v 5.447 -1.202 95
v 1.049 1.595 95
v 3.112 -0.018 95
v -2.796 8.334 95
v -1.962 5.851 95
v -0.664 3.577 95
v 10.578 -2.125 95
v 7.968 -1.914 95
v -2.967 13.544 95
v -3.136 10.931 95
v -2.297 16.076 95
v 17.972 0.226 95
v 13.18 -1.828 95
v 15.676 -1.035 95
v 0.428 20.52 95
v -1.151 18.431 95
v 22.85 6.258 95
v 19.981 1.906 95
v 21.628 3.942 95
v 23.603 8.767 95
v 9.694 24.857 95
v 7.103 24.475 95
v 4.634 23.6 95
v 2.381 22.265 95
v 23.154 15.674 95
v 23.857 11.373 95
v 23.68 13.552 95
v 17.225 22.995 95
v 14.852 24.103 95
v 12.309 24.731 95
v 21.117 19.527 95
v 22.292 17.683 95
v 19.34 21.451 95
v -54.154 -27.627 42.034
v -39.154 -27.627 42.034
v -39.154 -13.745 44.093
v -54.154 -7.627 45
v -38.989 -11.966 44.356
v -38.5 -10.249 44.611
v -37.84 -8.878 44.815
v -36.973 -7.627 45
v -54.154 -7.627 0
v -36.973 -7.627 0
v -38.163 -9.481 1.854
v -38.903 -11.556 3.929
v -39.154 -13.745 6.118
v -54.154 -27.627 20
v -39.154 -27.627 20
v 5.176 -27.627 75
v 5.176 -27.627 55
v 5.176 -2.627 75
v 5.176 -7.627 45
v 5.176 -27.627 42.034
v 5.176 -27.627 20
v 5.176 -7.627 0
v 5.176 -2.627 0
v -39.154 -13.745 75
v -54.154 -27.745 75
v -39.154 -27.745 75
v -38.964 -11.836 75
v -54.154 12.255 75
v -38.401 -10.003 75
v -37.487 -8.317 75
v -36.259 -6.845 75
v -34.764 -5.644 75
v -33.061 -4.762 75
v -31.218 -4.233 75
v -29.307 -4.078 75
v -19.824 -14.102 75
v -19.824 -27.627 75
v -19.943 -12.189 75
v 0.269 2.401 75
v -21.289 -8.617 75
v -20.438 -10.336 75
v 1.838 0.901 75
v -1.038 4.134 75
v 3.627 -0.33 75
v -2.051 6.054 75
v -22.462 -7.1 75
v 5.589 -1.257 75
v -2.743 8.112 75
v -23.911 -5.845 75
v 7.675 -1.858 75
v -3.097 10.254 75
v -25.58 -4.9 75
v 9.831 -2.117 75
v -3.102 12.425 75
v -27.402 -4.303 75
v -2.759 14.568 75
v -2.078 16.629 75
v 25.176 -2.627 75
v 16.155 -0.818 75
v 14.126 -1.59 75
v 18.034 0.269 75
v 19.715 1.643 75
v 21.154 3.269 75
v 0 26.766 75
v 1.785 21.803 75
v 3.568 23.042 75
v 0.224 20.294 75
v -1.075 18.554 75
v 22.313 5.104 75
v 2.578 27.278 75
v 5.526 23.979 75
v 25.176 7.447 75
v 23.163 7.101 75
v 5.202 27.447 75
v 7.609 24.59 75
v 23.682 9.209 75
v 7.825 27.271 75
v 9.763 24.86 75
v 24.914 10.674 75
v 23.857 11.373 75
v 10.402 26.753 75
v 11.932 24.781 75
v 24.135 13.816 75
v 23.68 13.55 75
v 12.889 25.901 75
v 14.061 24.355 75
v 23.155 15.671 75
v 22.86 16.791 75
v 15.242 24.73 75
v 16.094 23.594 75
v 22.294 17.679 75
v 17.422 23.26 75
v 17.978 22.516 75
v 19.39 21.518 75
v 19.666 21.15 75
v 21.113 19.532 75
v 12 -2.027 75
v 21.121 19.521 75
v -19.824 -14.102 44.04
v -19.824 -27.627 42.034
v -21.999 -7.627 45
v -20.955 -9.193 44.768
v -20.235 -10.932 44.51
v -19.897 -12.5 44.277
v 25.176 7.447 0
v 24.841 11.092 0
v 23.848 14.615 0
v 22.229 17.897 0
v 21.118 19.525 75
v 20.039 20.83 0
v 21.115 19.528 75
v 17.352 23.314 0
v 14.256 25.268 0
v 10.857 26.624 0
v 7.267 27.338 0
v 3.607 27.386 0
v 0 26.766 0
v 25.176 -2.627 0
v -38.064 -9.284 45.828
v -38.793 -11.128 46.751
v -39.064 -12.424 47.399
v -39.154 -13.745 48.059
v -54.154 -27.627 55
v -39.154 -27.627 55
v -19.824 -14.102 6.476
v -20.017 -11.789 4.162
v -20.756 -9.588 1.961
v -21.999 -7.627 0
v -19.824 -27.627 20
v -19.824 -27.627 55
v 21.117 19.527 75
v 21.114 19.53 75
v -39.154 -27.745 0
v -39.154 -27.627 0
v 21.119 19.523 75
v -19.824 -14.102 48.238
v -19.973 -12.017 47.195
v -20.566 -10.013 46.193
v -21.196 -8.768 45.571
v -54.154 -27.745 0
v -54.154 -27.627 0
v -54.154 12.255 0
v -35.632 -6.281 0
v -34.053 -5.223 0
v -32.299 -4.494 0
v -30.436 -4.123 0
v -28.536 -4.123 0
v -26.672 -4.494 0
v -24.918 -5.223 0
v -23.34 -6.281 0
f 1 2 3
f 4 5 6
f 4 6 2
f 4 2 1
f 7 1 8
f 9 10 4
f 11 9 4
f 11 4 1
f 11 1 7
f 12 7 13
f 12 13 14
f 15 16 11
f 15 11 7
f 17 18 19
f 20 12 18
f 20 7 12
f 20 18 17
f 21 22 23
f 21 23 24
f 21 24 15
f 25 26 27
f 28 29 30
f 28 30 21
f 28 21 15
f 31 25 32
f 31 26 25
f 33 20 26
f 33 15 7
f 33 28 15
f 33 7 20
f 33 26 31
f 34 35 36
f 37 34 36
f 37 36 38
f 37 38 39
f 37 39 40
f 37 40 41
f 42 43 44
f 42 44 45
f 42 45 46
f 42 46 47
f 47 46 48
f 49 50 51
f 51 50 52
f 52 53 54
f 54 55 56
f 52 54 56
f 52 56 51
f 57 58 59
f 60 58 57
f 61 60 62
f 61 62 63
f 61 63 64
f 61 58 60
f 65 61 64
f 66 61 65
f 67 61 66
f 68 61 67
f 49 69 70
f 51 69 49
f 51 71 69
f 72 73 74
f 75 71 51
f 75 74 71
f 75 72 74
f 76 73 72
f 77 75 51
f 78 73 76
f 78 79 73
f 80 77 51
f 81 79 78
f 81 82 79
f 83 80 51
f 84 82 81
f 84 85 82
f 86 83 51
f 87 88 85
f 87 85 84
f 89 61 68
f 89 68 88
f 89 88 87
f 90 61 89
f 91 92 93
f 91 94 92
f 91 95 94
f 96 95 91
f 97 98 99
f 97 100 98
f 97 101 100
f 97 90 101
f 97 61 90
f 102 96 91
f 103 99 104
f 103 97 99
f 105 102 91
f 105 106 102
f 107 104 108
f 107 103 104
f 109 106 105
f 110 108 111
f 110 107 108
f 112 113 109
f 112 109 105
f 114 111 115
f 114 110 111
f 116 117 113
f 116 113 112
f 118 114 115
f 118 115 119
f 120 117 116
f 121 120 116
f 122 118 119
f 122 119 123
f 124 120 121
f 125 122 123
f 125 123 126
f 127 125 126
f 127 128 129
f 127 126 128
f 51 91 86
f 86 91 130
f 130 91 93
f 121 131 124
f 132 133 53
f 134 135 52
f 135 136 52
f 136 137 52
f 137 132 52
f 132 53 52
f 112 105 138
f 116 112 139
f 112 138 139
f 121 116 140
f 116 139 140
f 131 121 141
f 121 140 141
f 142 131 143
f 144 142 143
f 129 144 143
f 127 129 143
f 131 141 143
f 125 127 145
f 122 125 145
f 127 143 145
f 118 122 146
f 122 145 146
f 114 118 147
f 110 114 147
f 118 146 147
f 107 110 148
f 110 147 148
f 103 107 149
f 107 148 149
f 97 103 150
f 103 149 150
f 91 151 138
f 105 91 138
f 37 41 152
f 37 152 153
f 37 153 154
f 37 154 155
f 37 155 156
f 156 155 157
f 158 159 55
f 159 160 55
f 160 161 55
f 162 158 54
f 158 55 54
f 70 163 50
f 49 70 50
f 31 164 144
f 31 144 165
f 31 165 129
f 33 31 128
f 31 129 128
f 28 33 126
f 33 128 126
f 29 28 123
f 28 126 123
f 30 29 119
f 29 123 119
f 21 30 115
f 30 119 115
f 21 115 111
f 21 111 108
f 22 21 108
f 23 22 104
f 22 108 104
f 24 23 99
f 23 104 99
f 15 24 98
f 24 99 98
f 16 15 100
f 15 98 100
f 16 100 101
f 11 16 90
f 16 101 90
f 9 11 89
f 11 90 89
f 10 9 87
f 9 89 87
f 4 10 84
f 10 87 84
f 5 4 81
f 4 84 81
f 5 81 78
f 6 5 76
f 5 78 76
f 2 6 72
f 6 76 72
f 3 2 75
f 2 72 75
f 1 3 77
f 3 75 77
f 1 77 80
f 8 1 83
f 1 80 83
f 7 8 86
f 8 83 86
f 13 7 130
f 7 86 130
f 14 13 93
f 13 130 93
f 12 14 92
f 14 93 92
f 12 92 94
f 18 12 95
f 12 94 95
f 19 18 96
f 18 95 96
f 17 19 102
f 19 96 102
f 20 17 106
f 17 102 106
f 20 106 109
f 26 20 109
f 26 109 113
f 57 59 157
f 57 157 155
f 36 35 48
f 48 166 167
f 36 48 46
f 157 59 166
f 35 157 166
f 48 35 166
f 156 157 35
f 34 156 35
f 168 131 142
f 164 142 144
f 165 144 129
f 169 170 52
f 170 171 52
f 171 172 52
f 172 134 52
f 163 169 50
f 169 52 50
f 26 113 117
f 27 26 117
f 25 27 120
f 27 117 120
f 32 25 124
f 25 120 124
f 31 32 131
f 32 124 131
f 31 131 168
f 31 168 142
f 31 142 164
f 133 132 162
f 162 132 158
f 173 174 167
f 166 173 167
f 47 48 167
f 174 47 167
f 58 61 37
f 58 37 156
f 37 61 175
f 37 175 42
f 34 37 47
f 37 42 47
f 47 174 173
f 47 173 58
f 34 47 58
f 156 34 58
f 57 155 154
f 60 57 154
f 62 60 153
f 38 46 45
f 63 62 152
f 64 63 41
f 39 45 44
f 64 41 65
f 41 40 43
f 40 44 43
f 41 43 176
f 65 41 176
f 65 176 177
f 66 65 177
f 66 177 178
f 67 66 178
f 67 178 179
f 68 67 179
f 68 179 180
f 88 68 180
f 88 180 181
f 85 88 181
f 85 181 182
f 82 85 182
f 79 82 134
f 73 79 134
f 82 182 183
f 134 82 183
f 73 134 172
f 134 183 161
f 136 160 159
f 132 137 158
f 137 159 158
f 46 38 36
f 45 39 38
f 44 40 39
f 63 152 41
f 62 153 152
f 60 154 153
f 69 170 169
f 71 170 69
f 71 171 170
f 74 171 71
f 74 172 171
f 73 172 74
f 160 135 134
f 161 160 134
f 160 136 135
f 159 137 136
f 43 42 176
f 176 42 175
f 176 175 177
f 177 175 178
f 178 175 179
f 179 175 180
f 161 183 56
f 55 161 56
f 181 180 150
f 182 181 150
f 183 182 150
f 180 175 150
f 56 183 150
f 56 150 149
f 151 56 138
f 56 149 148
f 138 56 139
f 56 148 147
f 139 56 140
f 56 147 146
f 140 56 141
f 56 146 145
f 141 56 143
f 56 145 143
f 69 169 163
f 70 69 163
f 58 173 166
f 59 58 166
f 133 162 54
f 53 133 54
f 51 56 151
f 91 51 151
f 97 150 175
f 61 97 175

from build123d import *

# Parameters (mm, degrees)
F1_DEPTH = 75
F3_DEPTH = 20
F5_DEPTH = 59.331604


with BuildPart() as f1:
    # F0 (on Top) → F1 (new body)
    with BuildSketch(Plane.XY):
        with BuildLine():
            Line((0, 26.765937), (-54.154223, 12.255357))
            Line((-54.154223, 12.255357), (-54.154223, -27.744643))
            Line((-54.154223, -27.744643), (-39.154223, -27.744643))
            Line((-39.154223, -27.744643), (-39.154223, -13.744643))
            ThreePointArc((-39.154223, -13.744643), (-29.306659, -4.077686), (-19.823619, -14.102482))
            Line((-19.823619, -14.102482), (-19.823619, -27.626852))
            Line((-19.823619, -27.626852), (5.176381, -27.626852))
            Line((5.176381, -27.626852), (5.176381, -2.626852))
            Line((5.176381, -2.626852), (25.176381, -2.626852))
            Line((25.176381, -2.626852), (25.176381, 7.44742))
            ThreePointArc((25.176381, 7.44742), (17.351609, 23.314487), (0, 26.765937))
        make_face()
    extrude(amount=F1_DEPTH)

    # F2 (on face) → F3 (join)
    with BuildSketch(Plane.XY.offset(75)):
        with BuildLine():
            ThreePointArc((21.116702, 19.526583), (-2.439619, 7.072345), (23.856985, 11.373148))
            ThreePointArc((23.856985, 11.373148), (23.15359, 15.673952), (21.116702, 19.526583))
        make_face()
    extrude(amount=F3_DEPTH)

    # F4 (on face) → F5 (cut, through all)
    with BuildSketch(Plane.YZ.offset(5.176381)):
        Polygon((-7.626852, 0), (-27.626852, 20), (-27.626852, 0), align=None)
        Polygon((-7.626852, 45), (-27.626852, 55), (-27.626852, 42.03419), align=None)
    extrude(amount=-F5_DEPTH, mode=Mode.SUBTRACT)


solid = f1.part
